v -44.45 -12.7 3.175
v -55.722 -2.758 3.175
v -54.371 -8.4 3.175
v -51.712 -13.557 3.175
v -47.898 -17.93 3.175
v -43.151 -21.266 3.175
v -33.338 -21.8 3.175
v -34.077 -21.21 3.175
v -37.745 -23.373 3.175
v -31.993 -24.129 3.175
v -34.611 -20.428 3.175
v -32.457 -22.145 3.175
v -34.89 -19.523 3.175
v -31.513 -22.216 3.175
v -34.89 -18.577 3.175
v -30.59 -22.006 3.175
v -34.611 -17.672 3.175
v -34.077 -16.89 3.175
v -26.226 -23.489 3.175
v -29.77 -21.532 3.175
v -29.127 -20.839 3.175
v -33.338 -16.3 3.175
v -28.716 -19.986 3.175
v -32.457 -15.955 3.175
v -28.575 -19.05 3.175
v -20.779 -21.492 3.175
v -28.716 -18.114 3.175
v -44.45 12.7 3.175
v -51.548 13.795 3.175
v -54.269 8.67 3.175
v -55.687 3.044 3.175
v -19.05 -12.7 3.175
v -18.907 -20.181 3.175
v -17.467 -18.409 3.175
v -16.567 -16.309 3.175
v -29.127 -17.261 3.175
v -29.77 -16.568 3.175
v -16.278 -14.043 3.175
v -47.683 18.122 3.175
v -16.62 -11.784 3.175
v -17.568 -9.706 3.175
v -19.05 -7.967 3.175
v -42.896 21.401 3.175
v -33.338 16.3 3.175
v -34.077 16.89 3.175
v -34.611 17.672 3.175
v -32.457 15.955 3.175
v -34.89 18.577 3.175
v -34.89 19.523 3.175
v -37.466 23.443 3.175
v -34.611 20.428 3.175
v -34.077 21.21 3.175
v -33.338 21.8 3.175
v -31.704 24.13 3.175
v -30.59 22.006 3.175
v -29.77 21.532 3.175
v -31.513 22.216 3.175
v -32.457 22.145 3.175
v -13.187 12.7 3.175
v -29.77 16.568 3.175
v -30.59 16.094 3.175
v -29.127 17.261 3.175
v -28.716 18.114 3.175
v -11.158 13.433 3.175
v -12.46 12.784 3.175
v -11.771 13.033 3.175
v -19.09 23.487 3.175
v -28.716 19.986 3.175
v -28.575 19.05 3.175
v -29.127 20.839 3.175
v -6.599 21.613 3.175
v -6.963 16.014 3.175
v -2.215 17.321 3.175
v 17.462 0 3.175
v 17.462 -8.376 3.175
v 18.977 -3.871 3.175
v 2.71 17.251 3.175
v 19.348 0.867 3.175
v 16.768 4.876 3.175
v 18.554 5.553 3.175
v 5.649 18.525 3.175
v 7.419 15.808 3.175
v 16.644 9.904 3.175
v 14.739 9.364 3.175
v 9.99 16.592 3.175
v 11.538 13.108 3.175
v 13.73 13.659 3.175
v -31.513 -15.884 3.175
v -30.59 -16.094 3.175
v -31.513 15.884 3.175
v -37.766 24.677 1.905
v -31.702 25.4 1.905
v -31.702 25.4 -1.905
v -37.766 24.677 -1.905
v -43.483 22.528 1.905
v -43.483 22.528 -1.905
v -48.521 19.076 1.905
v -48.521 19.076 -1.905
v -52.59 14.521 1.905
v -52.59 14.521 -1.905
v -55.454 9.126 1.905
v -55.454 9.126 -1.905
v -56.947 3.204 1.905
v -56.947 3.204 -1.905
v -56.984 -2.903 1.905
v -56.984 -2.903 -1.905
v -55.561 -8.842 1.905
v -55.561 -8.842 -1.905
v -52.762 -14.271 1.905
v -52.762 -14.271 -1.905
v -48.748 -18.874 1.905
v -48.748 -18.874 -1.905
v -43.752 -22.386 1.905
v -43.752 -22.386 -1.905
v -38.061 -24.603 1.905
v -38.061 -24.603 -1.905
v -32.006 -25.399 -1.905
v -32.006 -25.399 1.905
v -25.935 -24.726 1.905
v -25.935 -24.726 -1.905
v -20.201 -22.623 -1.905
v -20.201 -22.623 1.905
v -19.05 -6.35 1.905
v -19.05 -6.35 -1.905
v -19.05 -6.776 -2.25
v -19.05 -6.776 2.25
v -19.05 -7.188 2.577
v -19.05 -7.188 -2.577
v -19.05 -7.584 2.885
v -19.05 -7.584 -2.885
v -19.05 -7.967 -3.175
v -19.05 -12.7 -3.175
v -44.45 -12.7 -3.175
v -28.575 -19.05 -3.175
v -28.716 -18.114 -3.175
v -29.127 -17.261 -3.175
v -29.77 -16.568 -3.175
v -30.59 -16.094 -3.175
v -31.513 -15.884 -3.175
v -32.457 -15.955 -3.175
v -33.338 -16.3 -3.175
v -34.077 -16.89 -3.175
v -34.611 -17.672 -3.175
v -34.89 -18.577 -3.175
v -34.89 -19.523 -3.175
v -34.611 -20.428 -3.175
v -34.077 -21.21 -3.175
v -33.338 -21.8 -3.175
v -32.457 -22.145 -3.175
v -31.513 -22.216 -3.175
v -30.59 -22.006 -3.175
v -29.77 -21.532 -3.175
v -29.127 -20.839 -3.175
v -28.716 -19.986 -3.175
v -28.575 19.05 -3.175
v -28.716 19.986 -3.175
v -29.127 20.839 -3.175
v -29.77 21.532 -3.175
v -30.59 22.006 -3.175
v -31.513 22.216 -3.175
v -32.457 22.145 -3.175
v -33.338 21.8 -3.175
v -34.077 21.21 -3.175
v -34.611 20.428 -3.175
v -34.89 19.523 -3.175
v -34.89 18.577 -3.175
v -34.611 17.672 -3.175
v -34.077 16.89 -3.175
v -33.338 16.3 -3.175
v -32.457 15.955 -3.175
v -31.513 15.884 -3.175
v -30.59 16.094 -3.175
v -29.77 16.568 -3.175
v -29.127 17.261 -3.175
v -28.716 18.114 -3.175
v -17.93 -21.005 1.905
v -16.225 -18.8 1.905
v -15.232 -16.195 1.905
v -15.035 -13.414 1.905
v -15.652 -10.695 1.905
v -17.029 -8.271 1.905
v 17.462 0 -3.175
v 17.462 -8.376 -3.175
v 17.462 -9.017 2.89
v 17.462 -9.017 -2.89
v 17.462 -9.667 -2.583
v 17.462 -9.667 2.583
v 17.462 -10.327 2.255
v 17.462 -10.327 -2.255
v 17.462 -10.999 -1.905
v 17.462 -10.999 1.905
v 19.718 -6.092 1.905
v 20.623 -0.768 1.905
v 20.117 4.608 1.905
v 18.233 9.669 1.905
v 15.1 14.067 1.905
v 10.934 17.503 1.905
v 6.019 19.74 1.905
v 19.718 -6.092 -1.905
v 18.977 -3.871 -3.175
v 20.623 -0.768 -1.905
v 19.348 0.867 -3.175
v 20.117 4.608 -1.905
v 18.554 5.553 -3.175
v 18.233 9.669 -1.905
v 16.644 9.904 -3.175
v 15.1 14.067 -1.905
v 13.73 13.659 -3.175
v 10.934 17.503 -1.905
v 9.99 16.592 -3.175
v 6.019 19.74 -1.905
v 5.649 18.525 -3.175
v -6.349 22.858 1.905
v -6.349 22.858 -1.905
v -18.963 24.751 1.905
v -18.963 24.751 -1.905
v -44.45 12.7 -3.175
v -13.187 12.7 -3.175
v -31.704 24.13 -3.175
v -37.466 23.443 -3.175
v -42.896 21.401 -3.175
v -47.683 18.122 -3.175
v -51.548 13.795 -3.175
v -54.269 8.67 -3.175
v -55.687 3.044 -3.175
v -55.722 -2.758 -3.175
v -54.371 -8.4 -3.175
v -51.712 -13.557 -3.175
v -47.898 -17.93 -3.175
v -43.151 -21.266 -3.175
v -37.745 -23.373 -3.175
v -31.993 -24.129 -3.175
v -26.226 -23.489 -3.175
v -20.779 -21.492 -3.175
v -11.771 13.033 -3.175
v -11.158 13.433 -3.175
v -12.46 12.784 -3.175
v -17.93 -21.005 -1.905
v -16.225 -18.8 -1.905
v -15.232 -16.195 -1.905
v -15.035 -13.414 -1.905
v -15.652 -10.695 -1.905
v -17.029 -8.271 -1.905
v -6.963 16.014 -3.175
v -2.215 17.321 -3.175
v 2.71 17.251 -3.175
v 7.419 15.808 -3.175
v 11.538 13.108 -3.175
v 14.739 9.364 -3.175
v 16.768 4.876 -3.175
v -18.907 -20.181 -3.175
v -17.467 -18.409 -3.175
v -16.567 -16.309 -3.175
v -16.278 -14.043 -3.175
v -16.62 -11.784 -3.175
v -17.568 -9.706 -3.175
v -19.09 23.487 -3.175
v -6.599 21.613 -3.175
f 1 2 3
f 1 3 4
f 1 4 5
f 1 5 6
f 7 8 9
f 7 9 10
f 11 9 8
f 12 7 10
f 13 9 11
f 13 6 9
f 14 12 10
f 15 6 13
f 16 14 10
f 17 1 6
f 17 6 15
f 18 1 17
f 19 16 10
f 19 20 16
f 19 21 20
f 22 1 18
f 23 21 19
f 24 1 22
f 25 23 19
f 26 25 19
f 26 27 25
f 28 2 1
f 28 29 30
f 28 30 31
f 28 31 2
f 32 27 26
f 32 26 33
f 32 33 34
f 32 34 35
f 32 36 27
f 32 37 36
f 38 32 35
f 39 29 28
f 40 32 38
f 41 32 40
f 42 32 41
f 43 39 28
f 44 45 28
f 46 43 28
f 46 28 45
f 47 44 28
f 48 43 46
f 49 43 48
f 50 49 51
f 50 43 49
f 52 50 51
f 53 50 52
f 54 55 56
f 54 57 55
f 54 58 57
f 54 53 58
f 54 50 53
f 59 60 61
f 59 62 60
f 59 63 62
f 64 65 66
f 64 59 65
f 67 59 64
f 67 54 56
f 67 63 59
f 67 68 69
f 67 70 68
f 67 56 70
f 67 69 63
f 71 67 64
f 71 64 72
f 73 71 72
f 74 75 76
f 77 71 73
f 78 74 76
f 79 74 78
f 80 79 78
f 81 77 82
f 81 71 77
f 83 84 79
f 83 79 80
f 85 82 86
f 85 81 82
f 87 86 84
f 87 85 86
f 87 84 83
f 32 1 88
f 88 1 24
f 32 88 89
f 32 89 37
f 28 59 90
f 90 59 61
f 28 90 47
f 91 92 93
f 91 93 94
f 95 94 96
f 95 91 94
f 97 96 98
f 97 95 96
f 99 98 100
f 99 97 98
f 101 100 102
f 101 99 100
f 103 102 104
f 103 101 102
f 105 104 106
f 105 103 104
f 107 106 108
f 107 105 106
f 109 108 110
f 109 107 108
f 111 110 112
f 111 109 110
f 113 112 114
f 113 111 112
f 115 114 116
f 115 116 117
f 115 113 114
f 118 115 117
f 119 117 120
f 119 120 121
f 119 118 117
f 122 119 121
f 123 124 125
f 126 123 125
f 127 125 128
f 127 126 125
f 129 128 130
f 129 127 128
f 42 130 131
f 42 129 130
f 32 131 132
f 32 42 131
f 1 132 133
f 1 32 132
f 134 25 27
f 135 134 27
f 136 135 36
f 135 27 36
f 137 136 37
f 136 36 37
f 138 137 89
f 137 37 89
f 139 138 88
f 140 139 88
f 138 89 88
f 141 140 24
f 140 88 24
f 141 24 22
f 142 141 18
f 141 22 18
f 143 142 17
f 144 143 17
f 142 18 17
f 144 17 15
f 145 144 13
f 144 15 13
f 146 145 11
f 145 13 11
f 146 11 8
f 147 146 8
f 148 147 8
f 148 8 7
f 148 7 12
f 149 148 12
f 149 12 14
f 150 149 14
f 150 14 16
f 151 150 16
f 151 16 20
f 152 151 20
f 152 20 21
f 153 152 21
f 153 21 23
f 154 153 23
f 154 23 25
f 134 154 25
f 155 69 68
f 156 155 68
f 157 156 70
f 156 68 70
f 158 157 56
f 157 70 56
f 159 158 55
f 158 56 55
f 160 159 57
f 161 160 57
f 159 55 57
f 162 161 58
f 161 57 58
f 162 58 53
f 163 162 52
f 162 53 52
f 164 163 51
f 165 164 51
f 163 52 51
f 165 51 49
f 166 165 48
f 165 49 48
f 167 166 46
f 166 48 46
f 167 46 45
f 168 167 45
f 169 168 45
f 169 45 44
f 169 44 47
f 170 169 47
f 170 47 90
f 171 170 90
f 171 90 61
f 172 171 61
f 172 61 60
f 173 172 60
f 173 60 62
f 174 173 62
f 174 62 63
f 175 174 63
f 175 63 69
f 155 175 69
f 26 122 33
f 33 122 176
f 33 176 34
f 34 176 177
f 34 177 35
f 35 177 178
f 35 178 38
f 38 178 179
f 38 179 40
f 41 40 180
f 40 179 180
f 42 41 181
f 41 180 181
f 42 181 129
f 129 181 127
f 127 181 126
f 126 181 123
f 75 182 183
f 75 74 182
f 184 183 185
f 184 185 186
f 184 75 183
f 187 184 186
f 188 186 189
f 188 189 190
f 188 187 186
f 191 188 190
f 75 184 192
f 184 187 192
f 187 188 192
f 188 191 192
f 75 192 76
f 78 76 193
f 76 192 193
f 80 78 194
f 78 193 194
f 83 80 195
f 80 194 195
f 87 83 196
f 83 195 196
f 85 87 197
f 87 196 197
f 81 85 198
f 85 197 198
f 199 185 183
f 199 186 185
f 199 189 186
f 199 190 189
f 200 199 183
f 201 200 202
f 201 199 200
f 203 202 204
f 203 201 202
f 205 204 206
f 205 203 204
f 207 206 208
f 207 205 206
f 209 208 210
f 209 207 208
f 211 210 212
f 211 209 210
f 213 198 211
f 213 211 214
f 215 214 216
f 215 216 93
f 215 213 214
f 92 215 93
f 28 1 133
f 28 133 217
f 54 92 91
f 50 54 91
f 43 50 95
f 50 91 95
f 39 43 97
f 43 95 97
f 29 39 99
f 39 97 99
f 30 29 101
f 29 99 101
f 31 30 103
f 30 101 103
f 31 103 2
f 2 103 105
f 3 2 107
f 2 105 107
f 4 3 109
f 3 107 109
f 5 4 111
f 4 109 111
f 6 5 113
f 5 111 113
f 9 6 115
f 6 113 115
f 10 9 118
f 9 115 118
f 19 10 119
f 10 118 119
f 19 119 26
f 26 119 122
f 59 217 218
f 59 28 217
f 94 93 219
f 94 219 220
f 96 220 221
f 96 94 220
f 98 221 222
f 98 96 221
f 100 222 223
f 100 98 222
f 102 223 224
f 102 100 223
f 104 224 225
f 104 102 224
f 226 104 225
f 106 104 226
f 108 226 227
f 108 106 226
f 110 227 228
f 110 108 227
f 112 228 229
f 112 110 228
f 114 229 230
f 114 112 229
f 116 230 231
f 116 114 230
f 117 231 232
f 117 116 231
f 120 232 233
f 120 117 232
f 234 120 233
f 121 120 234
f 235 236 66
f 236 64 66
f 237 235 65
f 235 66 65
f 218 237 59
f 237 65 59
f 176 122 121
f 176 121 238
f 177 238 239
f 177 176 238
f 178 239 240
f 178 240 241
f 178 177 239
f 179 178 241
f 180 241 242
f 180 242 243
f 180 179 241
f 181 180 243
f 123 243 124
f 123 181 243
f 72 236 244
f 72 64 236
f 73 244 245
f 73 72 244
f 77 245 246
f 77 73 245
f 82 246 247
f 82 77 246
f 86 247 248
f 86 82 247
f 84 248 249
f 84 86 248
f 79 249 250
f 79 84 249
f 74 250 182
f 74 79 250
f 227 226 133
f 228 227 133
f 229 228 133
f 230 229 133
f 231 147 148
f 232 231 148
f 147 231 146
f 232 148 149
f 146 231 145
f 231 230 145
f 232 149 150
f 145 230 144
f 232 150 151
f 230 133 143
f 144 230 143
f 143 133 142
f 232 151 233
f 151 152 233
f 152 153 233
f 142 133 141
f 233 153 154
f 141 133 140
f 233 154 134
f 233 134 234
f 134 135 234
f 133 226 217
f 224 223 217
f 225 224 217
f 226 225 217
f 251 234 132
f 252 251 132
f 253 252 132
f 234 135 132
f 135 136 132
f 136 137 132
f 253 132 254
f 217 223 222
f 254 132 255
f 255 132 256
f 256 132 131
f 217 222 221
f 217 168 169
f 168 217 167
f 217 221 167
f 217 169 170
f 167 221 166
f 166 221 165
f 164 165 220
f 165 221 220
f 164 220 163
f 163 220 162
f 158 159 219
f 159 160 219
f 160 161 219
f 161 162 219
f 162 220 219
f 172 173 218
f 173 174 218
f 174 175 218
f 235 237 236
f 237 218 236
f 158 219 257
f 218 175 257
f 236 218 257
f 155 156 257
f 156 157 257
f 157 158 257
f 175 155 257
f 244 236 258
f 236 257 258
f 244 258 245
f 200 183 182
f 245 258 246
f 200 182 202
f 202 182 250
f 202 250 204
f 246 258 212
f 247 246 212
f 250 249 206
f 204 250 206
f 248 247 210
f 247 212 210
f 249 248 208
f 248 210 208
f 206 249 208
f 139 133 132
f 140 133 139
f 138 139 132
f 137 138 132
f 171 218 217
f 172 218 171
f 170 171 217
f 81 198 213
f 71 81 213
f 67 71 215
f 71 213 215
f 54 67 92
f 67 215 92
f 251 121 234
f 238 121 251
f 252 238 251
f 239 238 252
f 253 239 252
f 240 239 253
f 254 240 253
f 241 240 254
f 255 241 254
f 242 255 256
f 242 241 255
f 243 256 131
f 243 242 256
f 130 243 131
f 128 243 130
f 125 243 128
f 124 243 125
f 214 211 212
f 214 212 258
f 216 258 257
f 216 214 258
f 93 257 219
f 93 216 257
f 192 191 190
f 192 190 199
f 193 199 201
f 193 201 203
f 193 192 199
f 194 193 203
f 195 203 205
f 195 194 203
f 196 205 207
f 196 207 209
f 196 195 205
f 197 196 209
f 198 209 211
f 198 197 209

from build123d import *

# Parameters (mm, degrees)
BOSS_EXTRUDE1_DEPTH     = 3.175
FILLET1_R               = 3.175
SKETCH2_R               = 3.175
CUT_EXTRUDE1_DEPTH      = 1
CUT_EXTRUDE1_DEPTH_BACK = 7.35
CHAMFER1_SIZE           = 1.27


with BuildPart() as part:
    # Sketch1 → Boss-Extrude1 (new body, symmetric)
    with BuildSketch(Plane.XY):
        with BuildLine():
            Line((-19.05, -12.7), (-44.45, -12.7))
            Line((-44.45, -12.7), (-44.45, 12.7))
            Line((-44.45, 12.7), (-11.985362166, 12.7))
            ThreePointArc((-11.985362166, 12.7), (6.915364033, 16.034857235), (17.4625, 0))
            Line((17.4625, 0), (17.4625, -10.998522628))
            ThreePointArc((17.4625, -10.998522628), (19.34076991, 7.200071217), (6.019270833, 19.740181987))
            ThreePointArc((6.019270833, 19.740181987), (-12.632886304, 23.959177626), (-31.701893939, 25.399954445))
            ThreePointArc((-31.701893939, 25.399954445), (-56.451545619, -5.915542582), (-20.201381574, -22.622763148))
            ThreePointArc((-20.201381574, -22.622763148), (-15.030866787, -14.811488972), (-19.05, -6.35))
            Line((-19.05, -6.35), (-19.05, -12.7))
        make_face()
    extrude(amount=BOSS_EXTRUDE1_DEPTH, both=True)

    # Fillet1
    fillet1_edges = [part.edges().sort_by_distance(p)[0] for p in [
        (-11.985362166, 12.7, 0),
    ]]
    fillet(fillet1_edges, radius=FILLET1_R)

    # Sketch2 → Cut-Extrude1 (cut, two sides)
    with BuildSketch(Plane.XY.offset(3.175)) as cut_extrude1_sk:
        with Locations((-31.75, -19.05)):
            Circle(SKETCH2_R)
        with Locations((-31.75, 19.05)):
            Circle(SKETCH2_R)
    extrude(amount=CUT_EXTRUDE1_DEPTH, mode=Mode.SUBTRACT)
    extrude(cut_extrude1_sk.sketch, amount=-CUT_EXTRUDE1_DEPTH_BACK, mode=Mode.SUBTRACT)

    # Chamfer1
    chamfer1_edges = [part.edges().sort_by_distance(p)[0] for p in [
        (-15.030866787, -14.811488972, -3.175),
        (-56.451545619, -5.915542582, -3.175),
        (-12.632886304, 23.959177626, -3.175),
        (19.34076991, 7.200071217, -3.175),
        (19.34076991, 7.200071217, 3.175),
        (-12.632886304, 23.959177626, 3.175),
        (-56.451545619, -5.915542582, 3.175),
        (-15.030866787, -14.811488972, 3.175),
    ]]
    chamfer(chamfer1_edges, length=CHAMFER1_SIZE)


solid = part.part
